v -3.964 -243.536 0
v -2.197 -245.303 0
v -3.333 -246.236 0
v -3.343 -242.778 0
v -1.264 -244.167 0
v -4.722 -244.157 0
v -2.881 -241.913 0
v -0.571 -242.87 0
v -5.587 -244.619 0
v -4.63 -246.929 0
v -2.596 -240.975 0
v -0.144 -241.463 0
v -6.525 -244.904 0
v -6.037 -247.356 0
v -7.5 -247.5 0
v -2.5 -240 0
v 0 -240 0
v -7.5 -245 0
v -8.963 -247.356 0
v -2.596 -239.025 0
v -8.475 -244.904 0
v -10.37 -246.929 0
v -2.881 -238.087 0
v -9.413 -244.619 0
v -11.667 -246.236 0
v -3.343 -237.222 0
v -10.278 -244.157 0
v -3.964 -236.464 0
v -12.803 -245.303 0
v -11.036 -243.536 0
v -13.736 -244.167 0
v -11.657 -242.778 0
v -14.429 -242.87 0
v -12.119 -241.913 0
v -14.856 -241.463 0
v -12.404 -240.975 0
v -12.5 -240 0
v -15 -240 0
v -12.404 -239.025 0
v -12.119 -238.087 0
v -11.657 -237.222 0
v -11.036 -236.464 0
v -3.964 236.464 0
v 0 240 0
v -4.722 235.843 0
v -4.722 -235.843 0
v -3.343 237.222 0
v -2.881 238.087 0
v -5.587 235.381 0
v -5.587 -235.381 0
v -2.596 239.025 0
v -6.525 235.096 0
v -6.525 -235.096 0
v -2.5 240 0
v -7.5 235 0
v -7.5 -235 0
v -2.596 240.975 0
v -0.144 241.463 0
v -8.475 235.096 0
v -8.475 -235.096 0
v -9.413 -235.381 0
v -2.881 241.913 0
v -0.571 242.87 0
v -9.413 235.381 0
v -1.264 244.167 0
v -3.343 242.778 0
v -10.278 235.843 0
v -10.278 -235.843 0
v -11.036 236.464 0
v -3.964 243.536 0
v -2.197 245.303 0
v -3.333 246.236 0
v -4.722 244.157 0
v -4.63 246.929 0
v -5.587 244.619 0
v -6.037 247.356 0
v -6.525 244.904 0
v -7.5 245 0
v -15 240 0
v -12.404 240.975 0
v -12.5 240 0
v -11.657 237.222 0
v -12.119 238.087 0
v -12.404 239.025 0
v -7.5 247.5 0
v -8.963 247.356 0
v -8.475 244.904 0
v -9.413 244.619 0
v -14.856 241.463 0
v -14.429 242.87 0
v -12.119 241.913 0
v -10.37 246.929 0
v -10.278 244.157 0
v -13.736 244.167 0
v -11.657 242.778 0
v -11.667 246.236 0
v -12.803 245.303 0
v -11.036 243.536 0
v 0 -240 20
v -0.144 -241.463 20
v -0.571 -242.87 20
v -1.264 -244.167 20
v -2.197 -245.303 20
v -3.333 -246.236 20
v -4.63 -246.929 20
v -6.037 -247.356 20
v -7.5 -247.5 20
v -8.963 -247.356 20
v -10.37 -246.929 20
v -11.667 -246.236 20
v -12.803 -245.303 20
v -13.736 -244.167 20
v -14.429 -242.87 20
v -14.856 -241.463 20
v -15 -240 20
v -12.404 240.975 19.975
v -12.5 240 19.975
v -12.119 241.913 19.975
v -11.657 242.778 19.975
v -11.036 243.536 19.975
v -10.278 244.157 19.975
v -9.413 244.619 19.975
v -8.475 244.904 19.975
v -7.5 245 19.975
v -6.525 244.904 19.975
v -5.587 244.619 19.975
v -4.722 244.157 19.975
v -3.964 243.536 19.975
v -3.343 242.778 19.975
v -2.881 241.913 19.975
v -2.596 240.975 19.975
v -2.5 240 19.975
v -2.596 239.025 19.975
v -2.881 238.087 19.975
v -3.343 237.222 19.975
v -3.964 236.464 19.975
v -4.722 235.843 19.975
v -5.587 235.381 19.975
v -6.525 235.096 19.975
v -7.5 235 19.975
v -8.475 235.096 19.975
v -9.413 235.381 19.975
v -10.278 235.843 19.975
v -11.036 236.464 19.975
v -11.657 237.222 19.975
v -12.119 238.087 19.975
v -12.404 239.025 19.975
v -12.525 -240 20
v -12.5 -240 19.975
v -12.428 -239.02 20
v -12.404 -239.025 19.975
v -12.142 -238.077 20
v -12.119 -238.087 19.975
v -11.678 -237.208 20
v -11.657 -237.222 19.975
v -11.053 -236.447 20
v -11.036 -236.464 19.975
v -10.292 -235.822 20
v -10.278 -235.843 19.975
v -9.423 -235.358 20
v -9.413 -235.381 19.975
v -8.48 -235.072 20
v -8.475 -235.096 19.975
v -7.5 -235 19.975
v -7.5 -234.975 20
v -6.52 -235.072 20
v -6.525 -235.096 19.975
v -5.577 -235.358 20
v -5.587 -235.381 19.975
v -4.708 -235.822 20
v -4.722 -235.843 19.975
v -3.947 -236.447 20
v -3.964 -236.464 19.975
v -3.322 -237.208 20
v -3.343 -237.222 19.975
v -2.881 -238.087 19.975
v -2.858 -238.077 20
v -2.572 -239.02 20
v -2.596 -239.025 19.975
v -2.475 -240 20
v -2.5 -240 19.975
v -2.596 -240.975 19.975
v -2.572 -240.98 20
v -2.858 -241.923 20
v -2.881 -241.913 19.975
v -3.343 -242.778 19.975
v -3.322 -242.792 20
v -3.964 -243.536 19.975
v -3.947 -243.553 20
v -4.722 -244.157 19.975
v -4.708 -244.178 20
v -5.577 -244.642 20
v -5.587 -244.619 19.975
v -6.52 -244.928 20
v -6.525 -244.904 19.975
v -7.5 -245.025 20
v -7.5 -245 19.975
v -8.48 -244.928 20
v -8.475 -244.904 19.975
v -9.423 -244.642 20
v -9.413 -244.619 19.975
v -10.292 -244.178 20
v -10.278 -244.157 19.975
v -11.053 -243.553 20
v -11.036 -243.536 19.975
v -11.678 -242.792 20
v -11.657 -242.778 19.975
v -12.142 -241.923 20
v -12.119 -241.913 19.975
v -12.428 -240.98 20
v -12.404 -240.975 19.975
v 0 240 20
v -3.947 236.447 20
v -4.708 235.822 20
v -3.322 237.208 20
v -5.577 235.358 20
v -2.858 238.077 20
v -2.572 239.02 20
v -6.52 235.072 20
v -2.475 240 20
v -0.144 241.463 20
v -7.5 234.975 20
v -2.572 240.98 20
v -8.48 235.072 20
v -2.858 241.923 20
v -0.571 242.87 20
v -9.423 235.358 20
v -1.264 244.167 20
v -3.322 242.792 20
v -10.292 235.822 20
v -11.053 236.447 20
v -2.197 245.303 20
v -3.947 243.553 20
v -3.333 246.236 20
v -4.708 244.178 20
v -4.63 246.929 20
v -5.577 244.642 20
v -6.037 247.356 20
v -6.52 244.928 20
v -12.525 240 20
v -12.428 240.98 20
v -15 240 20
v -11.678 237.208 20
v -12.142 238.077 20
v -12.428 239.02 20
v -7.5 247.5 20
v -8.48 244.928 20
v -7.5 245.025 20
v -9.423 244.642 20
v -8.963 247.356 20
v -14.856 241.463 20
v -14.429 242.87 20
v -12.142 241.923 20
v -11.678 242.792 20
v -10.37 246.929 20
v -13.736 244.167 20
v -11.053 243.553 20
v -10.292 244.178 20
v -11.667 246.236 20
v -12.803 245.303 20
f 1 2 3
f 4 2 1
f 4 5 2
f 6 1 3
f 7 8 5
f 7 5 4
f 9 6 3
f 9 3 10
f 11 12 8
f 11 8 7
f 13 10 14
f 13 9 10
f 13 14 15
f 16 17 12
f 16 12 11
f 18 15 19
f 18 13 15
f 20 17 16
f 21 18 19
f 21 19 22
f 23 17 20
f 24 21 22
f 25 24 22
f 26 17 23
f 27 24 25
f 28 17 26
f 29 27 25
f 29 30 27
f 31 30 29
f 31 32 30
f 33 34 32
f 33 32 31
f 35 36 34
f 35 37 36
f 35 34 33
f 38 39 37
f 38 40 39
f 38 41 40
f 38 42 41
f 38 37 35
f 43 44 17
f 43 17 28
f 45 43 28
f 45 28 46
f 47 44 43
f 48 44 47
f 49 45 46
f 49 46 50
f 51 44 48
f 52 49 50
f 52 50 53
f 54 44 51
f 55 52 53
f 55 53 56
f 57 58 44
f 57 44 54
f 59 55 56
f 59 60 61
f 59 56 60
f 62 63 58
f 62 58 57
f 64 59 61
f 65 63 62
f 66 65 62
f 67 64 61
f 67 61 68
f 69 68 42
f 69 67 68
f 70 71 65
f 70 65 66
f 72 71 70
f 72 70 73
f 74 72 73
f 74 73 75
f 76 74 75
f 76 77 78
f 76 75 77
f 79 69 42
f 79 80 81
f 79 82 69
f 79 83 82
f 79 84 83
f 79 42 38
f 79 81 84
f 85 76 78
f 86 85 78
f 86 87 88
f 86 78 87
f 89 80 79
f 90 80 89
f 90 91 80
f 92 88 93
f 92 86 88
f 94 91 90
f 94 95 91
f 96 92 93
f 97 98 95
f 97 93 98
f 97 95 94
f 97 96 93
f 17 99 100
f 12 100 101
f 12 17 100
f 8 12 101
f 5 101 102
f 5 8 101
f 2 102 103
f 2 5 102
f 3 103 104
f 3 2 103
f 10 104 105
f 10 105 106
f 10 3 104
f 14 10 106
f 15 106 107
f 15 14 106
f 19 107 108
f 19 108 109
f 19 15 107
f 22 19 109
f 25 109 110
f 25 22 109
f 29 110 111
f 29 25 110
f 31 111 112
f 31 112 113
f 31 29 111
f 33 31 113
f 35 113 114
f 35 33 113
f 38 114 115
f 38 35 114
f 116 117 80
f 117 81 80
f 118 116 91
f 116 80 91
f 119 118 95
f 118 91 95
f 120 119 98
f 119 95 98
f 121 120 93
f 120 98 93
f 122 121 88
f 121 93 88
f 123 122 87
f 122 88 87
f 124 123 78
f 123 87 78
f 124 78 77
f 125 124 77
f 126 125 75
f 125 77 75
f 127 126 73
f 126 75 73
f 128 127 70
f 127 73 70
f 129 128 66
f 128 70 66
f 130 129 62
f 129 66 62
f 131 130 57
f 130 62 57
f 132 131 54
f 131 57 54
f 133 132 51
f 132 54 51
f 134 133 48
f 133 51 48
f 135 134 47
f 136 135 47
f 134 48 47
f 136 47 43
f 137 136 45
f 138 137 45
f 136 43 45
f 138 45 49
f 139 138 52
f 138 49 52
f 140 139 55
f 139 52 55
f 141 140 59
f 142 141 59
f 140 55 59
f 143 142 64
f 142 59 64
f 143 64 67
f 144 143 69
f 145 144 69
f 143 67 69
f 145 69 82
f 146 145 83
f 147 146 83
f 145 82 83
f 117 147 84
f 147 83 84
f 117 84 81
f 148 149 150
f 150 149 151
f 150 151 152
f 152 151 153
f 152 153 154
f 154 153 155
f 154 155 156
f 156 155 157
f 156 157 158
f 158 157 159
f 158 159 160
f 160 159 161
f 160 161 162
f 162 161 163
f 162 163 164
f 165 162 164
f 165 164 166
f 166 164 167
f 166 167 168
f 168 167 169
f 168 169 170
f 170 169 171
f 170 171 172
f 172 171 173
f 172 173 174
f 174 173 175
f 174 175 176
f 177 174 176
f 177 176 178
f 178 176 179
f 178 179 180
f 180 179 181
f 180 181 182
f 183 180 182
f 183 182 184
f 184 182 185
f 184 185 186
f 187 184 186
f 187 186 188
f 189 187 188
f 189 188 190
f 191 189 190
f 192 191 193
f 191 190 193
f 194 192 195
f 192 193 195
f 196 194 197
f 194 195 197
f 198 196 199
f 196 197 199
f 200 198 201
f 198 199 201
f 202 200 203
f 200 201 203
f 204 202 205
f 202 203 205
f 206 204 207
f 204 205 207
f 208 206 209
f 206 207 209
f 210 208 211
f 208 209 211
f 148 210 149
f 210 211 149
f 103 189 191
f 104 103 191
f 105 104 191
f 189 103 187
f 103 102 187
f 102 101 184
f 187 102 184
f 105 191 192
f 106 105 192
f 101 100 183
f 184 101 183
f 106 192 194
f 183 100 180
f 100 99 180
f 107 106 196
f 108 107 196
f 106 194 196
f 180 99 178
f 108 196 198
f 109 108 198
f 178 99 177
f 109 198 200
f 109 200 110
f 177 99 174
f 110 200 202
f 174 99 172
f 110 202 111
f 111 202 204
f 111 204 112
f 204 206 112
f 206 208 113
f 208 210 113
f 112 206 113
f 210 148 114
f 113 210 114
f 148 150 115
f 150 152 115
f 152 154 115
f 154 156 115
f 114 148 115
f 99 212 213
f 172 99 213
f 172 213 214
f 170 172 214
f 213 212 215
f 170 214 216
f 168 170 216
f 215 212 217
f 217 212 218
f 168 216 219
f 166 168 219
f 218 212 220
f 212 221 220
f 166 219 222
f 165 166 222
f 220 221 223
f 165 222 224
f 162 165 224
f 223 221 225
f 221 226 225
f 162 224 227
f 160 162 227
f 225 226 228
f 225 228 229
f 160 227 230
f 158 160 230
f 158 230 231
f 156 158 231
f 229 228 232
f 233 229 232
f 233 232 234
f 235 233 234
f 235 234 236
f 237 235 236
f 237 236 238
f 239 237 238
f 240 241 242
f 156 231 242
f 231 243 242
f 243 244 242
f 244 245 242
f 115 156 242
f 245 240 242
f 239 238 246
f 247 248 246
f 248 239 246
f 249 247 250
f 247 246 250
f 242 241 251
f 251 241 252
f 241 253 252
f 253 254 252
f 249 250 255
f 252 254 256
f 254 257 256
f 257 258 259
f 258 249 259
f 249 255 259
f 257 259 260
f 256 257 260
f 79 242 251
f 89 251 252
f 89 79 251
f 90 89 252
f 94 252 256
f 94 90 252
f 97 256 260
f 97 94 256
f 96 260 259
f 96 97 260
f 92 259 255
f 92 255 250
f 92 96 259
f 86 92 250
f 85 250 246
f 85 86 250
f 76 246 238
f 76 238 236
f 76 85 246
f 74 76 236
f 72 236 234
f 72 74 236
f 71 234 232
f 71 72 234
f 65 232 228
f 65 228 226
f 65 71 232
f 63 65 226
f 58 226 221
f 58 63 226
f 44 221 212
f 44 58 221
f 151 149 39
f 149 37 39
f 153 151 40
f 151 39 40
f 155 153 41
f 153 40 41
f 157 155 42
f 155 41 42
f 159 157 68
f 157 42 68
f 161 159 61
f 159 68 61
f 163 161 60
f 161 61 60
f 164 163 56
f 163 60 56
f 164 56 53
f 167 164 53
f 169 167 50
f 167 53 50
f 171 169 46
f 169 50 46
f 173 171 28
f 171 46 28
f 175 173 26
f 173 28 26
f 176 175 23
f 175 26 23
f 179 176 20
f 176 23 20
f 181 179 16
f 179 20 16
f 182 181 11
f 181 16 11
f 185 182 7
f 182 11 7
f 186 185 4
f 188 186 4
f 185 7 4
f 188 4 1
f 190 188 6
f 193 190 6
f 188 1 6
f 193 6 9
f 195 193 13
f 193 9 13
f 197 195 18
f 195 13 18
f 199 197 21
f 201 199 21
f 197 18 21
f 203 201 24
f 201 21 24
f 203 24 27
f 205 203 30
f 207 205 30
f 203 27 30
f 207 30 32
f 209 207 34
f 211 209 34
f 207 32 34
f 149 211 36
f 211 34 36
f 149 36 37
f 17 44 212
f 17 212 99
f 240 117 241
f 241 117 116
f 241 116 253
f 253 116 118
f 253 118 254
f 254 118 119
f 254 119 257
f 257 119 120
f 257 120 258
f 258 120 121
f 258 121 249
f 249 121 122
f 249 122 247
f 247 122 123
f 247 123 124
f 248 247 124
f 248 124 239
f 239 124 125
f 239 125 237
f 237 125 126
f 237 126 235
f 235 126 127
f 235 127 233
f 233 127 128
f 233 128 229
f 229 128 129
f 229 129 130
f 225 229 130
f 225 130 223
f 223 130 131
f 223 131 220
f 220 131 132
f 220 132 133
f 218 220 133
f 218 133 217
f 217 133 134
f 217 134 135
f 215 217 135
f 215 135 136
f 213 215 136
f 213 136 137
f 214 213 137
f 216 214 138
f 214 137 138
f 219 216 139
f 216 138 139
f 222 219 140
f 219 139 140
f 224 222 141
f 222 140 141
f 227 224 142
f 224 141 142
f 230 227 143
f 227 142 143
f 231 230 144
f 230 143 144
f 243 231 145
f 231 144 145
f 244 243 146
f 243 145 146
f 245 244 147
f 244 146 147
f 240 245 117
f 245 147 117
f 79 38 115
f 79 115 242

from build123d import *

# Parameters (mm, degrees)
BOSS_EXTRUDE1_DEPTH              = 20
F_10_0MM_DOWEL_HOLE1_D           = 10
F_10_0MM_DOWEL_HOLE1_CSINK_D     = 10.05
F_10_0MM_DOWEL_HOLE1_CSINK_ANGLE = 90


with BuildPart() as part:
    # Sketch2 → Boss-Extrude1 (new body)
    with BuildSketch(Plane.XY):
        with BuildLine():
            Line((-15, -240), (-15, 240))
            ThreePointArc((-15, 240), (-7.5, 247.5), (0, 240))
            Line((0, 240), (0, -240))
            ThreePointArc((0, -240), (-7.5, -247.5), (-15, -240))
        make_face()
    extrude(amount=BOSS_EXTRUDE1_DEPTH)

    # Ø10.0mm Dowel Hole1 (through all)
    with Locations(Plane.XY.offset(20)):
        with Locations((-7.5, 240), (-7.5, -240)):
            CounterSinkHole(F_10_0MM_DOWEL_HOLE1_D / 2, F_10_0MM_DOWEL_HOLE1_CSINK_D / 2, counter_sink_angle=F_10_0MM_DOWEL_HOLE1_CSINK_ANGLE)


solid = part.part
